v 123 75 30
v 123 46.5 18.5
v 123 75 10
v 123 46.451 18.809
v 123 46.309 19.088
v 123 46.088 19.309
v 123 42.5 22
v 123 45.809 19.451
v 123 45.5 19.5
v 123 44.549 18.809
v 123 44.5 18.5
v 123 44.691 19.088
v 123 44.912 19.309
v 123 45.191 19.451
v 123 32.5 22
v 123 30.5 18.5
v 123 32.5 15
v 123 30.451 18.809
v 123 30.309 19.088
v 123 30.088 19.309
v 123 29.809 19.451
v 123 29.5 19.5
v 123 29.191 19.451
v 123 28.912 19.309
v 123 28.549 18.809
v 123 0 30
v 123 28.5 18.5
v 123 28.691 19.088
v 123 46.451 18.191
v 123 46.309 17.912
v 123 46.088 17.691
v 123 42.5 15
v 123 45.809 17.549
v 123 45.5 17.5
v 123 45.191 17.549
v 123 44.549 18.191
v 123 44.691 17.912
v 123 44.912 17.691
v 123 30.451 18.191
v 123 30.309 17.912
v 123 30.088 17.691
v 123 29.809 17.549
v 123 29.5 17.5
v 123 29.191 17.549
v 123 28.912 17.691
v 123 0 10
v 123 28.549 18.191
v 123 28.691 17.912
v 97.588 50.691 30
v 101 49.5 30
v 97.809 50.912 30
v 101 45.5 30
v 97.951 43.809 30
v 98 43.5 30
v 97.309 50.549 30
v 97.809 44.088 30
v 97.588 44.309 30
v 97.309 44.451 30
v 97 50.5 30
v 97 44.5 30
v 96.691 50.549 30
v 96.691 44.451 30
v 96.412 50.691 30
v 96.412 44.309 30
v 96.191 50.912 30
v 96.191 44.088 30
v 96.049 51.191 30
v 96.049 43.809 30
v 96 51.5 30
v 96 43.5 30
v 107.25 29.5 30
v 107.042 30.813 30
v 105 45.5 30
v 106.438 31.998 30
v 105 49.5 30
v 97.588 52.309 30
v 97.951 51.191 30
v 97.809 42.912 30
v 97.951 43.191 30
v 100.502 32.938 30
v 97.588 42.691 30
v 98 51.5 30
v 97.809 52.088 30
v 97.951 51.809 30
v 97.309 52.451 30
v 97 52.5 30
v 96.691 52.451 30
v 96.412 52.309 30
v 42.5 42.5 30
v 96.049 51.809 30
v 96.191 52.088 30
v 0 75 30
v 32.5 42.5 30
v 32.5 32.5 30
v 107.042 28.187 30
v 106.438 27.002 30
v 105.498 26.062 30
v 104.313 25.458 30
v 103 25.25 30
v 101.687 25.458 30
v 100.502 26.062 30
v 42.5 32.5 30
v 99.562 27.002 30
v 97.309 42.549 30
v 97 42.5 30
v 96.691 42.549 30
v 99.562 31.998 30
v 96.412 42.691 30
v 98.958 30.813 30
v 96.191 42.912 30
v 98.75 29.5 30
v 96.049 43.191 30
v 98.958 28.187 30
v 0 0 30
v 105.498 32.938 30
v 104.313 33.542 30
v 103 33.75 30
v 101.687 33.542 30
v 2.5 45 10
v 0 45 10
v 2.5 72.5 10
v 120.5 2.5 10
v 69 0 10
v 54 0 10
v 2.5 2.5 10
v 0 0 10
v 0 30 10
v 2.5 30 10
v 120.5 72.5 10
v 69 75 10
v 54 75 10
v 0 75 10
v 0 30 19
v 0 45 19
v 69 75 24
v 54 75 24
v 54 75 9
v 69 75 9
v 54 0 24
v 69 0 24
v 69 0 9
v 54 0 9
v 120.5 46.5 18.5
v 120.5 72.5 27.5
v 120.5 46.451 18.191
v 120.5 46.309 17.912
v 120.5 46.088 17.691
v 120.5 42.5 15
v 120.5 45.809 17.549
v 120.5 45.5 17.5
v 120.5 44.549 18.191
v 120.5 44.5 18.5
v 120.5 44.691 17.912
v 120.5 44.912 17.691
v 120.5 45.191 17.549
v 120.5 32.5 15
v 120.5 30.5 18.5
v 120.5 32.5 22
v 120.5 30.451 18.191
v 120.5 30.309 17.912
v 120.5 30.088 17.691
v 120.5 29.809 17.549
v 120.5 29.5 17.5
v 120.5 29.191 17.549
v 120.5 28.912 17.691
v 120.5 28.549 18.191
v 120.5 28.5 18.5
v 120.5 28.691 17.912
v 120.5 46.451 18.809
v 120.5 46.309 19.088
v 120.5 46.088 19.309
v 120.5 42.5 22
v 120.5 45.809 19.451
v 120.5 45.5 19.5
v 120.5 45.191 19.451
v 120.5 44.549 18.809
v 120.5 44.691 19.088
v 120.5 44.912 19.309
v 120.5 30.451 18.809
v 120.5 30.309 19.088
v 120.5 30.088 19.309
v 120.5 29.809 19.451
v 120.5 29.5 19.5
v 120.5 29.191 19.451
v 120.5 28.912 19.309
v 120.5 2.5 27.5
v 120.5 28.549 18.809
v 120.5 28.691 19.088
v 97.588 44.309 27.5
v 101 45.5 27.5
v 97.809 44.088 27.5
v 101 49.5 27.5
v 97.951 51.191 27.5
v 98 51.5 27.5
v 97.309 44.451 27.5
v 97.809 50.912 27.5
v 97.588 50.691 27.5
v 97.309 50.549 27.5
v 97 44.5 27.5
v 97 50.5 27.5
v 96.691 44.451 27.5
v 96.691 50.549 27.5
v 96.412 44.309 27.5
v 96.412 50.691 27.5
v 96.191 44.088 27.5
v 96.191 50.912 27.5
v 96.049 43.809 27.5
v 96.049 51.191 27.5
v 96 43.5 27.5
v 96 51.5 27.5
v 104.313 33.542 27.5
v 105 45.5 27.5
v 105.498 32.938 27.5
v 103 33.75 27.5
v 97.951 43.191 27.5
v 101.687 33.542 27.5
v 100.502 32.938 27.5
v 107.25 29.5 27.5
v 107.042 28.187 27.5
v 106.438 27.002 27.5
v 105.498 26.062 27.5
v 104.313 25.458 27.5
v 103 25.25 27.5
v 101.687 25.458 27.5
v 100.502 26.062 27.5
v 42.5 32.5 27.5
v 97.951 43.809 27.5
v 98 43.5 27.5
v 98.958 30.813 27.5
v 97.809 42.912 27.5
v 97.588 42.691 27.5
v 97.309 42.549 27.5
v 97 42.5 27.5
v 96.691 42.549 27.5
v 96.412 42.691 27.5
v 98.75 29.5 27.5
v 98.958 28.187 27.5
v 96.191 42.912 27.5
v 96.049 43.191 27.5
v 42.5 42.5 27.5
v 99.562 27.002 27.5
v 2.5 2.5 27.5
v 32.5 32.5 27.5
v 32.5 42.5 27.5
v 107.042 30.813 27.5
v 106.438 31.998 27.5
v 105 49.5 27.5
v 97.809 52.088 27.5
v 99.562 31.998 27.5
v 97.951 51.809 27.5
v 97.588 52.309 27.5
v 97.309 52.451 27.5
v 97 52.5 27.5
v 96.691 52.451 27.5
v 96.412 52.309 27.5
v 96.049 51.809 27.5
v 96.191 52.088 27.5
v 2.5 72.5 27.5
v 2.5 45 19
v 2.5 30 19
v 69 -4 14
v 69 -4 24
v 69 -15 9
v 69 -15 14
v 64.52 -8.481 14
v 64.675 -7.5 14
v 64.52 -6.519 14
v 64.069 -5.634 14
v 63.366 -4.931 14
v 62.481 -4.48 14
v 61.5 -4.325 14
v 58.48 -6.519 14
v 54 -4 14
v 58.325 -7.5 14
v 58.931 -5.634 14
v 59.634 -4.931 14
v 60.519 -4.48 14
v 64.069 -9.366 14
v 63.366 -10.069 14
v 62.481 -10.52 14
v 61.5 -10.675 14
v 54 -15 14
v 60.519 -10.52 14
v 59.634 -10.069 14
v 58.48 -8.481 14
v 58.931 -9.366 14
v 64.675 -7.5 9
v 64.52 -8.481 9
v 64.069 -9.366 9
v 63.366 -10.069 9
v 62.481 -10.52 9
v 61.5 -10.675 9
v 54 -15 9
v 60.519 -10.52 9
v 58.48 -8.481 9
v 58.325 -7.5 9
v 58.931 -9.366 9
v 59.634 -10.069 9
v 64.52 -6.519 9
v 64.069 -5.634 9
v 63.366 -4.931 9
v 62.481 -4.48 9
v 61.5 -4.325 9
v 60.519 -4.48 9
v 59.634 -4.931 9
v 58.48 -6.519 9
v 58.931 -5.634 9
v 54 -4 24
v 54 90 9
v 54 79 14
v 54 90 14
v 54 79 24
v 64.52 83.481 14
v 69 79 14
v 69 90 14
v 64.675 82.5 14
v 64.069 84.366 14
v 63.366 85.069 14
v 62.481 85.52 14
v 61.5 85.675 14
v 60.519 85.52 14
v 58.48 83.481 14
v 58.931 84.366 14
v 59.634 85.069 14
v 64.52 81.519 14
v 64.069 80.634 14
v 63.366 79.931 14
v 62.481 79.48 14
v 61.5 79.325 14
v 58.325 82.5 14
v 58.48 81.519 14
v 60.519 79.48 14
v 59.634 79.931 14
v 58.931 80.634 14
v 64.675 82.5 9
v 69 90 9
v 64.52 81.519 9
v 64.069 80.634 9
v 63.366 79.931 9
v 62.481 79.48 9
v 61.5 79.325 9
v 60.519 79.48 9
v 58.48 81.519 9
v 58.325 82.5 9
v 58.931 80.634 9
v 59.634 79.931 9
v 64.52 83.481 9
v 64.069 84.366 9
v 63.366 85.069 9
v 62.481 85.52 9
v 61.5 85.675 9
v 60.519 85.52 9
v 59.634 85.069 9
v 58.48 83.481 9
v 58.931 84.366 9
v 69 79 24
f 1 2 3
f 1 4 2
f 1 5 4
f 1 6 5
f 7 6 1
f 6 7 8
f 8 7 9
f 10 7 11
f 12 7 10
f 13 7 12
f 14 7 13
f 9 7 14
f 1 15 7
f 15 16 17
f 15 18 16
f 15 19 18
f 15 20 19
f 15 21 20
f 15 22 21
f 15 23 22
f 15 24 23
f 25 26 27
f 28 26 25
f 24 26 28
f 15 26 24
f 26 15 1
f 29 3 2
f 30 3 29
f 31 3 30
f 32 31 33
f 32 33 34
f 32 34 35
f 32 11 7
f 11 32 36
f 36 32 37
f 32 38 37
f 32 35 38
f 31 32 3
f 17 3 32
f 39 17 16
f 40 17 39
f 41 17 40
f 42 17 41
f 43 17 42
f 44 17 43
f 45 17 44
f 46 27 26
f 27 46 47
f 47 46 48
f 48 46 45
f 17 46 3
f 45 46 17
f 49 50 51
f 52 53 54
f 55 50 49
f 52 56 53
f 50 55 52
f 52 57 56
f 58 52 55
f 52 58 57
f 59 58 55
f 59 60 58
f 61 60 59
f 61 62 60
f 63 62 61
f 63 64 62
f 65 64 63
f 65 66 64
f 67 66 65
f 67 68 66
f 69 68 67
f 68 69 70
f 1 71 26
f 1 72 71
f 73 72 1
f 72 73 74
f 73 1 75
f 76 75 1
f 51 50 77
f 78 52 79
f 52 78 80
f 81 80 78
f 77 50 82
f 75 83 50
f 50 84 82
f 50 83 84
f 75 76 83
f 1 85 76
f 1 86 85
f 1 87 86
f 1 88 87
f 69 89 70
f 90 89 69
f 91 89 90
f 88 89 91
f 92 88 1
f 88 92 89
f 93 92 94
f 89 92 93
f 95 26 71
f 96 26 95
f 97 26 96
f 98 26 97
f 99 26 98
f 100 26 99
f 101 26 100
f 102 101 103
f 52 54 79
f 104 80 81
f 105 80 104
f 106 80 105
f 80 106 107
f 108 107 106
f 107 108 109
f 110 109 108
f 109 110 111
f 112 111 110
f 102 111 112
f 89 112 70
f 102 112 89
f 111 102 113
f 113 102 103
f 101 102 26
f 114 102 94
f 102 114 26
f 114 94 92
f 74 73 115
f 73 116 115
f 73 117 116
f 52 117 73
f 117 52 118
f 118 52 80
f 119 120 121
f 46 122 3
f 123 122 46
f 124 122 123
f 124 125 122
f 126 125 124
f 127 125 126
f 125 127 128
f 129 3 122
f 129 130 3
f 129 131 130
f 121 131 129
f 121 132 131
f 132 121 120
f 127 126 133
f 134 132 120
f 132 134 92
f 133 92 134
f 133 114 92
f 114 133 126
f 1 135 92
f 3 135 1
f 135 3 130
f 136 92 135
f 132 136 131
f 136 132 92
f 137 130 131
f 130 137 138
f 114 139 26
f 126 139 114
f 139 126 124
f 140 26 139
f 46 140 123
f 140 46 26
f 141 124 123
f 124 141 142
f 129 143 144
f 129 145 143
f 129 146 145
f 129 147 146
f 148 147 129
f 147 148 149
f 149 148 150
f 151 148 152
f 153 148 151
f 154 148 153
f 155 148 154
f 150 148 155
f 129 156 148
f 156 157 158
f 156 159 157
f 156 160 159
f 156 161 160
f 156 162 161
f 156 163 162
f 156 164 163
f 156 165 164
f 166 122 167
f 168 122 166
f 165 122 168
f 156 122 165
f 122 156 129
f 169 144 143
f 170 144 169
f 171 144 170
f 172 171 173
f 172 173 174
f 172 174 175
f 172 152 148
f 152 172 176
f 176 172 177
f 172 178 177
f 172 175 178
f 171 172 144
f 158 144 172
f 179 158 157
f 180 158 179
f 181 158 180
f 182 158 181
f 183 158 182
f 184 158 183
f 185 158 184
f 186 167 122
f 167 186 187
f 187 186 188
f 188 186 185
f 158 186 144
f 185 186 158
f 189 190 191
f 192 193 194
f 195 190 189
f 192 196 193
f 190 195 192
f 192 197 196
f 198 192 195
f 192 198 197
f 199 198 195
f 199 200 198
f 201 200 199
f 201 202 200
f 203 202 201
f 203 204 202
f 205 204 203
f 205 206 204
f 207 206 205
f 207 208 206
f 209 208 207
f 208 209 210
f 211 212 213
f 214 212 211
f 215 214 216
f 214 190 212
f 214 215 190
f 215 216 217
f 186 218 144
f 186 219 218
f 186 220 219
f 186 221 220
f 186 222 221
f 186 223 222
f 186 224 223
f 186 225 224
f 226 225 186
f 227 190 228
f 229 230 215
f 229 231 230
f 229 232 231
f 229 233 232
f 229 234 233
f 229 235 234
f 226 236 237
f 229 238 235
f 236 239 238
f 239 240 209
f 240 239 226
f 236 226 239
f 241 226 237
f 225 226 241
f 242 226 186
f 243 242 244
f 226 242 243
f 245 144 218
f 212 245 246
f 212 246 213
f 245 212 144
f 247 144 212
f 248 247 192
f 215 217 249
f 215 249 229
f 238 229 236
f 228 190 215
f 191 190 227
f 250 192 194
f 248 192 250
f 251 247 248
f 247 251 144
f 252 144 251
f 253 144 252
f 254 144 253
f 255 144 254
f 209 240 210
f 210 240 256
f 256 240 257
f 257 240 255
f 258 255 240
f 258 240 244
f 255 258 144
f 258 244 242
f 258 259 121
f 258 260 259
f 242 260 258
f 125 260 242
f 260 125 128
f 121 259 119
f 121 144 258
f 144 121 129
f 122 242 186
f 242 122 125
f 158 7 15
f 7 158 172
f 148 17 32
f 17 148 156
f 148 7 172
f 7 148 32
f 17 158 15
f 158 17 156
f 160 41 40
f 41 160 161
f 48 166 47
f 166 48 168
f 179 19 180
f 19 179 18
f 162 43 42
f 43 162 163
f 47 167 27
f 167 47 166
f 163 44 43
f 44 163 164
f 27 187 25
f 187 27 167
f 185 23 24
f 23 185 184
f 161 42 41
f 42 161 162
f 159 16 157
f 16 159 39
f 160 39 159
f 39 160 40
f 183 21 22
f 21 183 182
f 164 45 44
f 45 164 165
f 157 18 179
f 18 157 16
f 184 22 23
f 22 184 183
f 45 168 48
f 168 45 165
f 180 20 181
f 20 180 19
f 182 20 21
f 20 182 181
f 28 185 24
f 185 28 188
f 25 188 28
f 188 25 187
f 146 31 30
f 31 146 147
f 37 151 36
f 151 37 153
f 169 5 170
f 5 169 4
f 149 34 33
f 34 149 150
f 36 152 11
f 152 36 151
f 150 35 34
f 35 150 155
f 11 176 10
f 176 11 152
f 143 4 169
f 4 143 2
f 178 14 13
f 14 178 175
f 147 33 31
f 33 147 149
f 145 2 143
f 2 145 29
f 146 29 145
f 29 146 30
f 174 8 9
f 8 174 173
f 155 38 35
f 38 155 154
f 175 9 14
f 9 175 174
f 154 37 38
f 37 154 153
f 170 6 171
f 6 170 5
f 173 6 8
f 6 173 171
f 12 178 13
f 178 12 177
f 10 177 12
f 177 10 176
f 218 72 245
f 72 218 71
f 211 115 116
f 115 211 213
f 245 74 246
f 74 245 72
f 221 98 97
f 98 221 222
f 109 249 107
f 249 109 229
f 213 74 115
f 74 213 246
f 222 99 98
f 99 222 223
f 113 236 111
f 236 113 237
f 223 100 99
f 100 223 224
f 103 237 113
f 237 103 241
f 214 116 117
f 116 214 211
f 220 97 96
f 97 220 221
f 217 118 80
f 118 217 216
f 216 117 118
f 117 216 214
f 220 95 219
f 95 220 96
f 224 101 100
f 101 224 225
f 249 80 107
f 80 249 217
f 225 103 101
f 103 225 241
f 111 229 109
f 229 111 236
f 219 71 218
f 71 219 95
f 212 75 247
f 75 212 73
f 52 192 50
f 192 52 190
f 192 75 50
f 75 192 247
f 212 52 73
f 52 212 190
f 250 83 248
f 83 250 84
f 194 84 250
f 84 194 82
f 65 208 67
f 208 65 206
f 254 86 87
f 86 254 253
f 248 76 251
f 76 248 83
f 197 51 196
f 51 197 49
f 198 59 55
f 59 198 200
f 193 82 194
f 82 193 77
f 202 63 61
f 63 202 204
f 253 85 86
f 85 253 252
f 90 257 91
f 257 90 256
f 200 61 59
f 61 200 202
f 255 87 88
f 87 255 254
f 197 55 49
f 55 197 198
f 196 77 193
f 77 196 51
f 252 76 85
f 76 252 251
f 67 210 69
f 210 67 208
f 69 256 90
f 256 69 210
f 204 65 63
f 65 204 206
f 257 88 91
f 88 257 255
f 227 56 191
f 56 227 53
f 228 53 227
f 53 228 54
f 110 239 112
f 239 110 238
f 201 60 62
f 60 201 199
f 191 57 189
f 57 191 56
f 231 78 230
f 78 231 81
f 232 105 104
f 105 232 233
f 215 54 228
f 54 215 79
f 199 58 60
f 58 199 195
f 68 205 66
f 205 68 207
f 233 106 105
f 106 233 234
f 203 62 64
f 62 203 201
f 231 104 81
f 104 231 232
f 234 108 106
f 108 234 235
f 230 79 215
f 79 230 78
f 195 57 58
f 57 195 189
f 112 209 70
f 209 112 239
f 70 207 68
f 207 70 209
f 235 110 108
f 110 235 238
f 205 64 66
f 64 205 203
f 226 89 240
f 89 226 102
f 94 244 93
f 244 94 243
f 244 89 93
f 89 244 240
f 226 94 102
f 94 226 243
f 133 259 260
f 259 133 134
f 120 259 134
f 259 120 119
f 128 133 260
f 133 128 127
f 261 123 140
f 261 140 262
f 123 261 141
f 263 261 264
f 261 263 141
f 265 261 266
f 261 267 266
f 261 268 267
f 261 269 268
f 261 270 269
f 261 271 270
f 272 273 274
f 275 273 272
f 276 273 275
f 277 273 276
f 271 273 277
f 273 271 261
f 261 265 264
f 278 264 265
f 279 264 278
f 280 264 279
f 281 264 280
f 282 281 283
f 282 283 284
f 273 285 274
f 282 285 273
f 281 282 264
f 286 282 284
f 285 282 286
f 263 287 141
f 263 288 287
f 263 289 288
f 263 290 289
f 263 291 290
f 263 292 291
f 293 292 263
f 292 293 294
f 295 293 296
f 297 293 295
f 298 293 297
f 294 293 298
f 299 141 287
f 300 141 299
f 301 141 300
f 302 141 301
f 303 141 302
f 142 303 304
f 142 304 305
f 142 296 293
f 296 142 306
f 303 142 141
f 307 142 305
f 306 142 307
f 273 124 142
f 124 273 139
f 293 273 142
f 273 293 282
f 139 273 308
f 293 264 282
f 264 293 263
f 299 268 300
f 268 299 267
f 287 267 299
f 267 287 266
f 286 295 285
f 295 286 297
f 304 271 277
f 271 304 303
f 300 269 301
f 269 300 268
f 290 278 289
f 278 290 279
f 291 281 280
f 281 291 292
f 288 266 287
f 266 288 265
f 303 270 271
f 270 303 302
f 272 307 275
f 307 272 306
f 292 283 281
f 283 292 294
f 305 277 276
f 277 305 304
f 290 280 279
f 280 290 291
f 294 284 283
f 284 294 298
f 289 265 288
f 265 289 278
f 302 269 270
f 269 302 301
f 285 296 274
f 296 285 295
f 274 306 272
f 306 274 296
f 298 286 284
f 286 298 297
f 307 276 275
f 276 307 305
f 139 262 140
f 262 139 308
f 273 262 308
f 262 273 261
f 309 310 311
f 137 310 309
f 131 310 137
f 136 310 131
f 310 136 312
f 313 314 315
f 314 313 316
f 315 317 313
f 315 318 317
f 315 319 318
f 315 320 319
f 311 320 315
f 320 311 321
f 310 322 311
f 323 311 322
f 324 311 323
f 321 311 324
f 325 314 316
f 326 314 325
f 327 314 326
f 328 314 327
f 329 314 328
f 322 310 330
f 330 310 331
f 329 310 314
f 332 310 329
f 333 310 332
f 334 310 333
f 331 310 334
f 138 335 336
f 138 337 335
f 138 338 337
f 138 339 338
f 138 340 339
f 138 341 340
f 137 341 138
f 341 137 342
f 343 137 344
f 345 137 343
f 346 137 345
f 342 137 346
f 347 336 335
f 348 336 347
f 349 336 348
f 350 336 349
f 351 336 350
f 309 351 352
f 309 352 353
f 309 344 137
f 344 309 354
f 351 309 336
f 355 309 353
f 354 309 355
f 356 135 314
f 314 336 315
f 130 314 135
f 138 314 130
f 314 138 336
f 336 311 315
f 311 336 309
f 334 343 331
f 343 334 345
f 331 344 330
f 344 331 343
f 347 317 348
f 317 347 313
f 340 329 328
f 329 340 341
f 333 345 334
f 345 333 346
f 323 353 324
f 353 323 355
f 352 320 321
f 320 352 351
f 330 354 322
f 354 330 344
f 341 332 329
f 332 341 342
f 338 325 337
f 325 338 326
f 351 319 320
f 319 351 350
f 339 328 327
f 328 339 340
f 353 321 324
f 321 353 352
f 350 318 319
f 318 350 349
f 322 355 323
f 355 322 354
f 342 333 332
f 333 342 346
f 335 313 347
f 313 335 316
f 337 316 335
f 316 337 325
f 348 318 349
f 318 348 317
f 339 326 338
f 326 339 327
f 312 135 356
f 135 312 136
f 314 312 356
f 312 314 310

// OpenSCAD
// file: rocketUheatercomp.scad
$fn = 20;

length=123;
width=75;
height=7.5;

difference(){
	cube([length,width,height]);
	translate([2.5, 2.5, 2.5])cube([116, 70, 6]);
}
module foot(){
	
	difference(){
		cube([15,15,7.5]);
		translate([7.5,7.5,-0.25])cylinder(d=6.35,8.5);
		
	}
}

translate([length/2 - 7.5, -15, 0])foot();
translate([length/2-7.5, width, 0])foot();

	
	
	
// main file
module caseTop(){
$fn = 20;

length=123;
width=75;
height=20;

difference(){
	cube([length,width,height]);
	translate([2.5,2.5,-1])cube([length-5, width-5, height-1.5]);
	translate([length-5, width/2 - 5, height-15])cube([10, 10, 7]);
	translate([length-5, width/2-8, height-11.5])rotate([0,90,0])cylinder(d=2, 10);
	translate([length-5, width/2+8, height-11.5])rotate([0,90,0])cylinder(d=2, 10);
	translate([length-20, width/2-8, height-3])cylinder(d=8.5, 10);
	translate([length-22, width/2+8, height-3])cube([4,4,10]);
	translate([length-26, width/2+14, height-3])cylinder(d=2,10);
	translate([length-26, width/2+6, height-3])cylinder(d=2,10);
	translate([width/2-5, width/2-5,0])cube([10,10,100]);
	translate([-1, width/2-7.5, -1])cube([15,15,10]);
}


module foot(){
	translate([0, 11, 0])cube([15, 4, 15]);
	difference(){
		cube([15,15,5]);
		translate([7.5,7.5,-0.25])cylinder(d=6.35,8.5);
	}
}




translate([length/2-7.5, -15, -1])foot();
rotate([0,0,180])translate([-length/2-7.5, -90, -1])foot();
}
translate([0,0,10])caseTop();
//include<rocketUcasebottom.scad>;
module heater(){
include<rocketUheatercomp.scad>;
}
//translate([0, 0,-8.5])heater();
